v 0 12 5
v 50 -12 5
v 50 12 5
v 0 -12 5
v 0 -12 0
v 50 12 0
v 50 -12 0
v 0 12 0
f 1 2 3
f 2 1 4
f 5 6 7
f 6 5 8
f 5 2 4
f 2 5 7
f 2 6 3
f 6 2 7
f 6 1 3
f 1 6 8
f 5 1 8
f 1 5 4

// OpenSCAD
// file: Library/center.scad
module center(axis){
	translate((axis / -2.0)){
		children();
	}
}
// main file
use <Library/center.scad>

//Length, width, height.
dimensions = [50, 24, 5];

module CylinderDispenser_Dispenser_Virgin_Hearth_Outer_Walkway(dimensions){
	center([0, dimensions[1], 0]){
		cube(dimensions);
	}
}

CylinderDispenser_Dispenser_Virgin_Hearth_Outer_Walkway(dimensions);
